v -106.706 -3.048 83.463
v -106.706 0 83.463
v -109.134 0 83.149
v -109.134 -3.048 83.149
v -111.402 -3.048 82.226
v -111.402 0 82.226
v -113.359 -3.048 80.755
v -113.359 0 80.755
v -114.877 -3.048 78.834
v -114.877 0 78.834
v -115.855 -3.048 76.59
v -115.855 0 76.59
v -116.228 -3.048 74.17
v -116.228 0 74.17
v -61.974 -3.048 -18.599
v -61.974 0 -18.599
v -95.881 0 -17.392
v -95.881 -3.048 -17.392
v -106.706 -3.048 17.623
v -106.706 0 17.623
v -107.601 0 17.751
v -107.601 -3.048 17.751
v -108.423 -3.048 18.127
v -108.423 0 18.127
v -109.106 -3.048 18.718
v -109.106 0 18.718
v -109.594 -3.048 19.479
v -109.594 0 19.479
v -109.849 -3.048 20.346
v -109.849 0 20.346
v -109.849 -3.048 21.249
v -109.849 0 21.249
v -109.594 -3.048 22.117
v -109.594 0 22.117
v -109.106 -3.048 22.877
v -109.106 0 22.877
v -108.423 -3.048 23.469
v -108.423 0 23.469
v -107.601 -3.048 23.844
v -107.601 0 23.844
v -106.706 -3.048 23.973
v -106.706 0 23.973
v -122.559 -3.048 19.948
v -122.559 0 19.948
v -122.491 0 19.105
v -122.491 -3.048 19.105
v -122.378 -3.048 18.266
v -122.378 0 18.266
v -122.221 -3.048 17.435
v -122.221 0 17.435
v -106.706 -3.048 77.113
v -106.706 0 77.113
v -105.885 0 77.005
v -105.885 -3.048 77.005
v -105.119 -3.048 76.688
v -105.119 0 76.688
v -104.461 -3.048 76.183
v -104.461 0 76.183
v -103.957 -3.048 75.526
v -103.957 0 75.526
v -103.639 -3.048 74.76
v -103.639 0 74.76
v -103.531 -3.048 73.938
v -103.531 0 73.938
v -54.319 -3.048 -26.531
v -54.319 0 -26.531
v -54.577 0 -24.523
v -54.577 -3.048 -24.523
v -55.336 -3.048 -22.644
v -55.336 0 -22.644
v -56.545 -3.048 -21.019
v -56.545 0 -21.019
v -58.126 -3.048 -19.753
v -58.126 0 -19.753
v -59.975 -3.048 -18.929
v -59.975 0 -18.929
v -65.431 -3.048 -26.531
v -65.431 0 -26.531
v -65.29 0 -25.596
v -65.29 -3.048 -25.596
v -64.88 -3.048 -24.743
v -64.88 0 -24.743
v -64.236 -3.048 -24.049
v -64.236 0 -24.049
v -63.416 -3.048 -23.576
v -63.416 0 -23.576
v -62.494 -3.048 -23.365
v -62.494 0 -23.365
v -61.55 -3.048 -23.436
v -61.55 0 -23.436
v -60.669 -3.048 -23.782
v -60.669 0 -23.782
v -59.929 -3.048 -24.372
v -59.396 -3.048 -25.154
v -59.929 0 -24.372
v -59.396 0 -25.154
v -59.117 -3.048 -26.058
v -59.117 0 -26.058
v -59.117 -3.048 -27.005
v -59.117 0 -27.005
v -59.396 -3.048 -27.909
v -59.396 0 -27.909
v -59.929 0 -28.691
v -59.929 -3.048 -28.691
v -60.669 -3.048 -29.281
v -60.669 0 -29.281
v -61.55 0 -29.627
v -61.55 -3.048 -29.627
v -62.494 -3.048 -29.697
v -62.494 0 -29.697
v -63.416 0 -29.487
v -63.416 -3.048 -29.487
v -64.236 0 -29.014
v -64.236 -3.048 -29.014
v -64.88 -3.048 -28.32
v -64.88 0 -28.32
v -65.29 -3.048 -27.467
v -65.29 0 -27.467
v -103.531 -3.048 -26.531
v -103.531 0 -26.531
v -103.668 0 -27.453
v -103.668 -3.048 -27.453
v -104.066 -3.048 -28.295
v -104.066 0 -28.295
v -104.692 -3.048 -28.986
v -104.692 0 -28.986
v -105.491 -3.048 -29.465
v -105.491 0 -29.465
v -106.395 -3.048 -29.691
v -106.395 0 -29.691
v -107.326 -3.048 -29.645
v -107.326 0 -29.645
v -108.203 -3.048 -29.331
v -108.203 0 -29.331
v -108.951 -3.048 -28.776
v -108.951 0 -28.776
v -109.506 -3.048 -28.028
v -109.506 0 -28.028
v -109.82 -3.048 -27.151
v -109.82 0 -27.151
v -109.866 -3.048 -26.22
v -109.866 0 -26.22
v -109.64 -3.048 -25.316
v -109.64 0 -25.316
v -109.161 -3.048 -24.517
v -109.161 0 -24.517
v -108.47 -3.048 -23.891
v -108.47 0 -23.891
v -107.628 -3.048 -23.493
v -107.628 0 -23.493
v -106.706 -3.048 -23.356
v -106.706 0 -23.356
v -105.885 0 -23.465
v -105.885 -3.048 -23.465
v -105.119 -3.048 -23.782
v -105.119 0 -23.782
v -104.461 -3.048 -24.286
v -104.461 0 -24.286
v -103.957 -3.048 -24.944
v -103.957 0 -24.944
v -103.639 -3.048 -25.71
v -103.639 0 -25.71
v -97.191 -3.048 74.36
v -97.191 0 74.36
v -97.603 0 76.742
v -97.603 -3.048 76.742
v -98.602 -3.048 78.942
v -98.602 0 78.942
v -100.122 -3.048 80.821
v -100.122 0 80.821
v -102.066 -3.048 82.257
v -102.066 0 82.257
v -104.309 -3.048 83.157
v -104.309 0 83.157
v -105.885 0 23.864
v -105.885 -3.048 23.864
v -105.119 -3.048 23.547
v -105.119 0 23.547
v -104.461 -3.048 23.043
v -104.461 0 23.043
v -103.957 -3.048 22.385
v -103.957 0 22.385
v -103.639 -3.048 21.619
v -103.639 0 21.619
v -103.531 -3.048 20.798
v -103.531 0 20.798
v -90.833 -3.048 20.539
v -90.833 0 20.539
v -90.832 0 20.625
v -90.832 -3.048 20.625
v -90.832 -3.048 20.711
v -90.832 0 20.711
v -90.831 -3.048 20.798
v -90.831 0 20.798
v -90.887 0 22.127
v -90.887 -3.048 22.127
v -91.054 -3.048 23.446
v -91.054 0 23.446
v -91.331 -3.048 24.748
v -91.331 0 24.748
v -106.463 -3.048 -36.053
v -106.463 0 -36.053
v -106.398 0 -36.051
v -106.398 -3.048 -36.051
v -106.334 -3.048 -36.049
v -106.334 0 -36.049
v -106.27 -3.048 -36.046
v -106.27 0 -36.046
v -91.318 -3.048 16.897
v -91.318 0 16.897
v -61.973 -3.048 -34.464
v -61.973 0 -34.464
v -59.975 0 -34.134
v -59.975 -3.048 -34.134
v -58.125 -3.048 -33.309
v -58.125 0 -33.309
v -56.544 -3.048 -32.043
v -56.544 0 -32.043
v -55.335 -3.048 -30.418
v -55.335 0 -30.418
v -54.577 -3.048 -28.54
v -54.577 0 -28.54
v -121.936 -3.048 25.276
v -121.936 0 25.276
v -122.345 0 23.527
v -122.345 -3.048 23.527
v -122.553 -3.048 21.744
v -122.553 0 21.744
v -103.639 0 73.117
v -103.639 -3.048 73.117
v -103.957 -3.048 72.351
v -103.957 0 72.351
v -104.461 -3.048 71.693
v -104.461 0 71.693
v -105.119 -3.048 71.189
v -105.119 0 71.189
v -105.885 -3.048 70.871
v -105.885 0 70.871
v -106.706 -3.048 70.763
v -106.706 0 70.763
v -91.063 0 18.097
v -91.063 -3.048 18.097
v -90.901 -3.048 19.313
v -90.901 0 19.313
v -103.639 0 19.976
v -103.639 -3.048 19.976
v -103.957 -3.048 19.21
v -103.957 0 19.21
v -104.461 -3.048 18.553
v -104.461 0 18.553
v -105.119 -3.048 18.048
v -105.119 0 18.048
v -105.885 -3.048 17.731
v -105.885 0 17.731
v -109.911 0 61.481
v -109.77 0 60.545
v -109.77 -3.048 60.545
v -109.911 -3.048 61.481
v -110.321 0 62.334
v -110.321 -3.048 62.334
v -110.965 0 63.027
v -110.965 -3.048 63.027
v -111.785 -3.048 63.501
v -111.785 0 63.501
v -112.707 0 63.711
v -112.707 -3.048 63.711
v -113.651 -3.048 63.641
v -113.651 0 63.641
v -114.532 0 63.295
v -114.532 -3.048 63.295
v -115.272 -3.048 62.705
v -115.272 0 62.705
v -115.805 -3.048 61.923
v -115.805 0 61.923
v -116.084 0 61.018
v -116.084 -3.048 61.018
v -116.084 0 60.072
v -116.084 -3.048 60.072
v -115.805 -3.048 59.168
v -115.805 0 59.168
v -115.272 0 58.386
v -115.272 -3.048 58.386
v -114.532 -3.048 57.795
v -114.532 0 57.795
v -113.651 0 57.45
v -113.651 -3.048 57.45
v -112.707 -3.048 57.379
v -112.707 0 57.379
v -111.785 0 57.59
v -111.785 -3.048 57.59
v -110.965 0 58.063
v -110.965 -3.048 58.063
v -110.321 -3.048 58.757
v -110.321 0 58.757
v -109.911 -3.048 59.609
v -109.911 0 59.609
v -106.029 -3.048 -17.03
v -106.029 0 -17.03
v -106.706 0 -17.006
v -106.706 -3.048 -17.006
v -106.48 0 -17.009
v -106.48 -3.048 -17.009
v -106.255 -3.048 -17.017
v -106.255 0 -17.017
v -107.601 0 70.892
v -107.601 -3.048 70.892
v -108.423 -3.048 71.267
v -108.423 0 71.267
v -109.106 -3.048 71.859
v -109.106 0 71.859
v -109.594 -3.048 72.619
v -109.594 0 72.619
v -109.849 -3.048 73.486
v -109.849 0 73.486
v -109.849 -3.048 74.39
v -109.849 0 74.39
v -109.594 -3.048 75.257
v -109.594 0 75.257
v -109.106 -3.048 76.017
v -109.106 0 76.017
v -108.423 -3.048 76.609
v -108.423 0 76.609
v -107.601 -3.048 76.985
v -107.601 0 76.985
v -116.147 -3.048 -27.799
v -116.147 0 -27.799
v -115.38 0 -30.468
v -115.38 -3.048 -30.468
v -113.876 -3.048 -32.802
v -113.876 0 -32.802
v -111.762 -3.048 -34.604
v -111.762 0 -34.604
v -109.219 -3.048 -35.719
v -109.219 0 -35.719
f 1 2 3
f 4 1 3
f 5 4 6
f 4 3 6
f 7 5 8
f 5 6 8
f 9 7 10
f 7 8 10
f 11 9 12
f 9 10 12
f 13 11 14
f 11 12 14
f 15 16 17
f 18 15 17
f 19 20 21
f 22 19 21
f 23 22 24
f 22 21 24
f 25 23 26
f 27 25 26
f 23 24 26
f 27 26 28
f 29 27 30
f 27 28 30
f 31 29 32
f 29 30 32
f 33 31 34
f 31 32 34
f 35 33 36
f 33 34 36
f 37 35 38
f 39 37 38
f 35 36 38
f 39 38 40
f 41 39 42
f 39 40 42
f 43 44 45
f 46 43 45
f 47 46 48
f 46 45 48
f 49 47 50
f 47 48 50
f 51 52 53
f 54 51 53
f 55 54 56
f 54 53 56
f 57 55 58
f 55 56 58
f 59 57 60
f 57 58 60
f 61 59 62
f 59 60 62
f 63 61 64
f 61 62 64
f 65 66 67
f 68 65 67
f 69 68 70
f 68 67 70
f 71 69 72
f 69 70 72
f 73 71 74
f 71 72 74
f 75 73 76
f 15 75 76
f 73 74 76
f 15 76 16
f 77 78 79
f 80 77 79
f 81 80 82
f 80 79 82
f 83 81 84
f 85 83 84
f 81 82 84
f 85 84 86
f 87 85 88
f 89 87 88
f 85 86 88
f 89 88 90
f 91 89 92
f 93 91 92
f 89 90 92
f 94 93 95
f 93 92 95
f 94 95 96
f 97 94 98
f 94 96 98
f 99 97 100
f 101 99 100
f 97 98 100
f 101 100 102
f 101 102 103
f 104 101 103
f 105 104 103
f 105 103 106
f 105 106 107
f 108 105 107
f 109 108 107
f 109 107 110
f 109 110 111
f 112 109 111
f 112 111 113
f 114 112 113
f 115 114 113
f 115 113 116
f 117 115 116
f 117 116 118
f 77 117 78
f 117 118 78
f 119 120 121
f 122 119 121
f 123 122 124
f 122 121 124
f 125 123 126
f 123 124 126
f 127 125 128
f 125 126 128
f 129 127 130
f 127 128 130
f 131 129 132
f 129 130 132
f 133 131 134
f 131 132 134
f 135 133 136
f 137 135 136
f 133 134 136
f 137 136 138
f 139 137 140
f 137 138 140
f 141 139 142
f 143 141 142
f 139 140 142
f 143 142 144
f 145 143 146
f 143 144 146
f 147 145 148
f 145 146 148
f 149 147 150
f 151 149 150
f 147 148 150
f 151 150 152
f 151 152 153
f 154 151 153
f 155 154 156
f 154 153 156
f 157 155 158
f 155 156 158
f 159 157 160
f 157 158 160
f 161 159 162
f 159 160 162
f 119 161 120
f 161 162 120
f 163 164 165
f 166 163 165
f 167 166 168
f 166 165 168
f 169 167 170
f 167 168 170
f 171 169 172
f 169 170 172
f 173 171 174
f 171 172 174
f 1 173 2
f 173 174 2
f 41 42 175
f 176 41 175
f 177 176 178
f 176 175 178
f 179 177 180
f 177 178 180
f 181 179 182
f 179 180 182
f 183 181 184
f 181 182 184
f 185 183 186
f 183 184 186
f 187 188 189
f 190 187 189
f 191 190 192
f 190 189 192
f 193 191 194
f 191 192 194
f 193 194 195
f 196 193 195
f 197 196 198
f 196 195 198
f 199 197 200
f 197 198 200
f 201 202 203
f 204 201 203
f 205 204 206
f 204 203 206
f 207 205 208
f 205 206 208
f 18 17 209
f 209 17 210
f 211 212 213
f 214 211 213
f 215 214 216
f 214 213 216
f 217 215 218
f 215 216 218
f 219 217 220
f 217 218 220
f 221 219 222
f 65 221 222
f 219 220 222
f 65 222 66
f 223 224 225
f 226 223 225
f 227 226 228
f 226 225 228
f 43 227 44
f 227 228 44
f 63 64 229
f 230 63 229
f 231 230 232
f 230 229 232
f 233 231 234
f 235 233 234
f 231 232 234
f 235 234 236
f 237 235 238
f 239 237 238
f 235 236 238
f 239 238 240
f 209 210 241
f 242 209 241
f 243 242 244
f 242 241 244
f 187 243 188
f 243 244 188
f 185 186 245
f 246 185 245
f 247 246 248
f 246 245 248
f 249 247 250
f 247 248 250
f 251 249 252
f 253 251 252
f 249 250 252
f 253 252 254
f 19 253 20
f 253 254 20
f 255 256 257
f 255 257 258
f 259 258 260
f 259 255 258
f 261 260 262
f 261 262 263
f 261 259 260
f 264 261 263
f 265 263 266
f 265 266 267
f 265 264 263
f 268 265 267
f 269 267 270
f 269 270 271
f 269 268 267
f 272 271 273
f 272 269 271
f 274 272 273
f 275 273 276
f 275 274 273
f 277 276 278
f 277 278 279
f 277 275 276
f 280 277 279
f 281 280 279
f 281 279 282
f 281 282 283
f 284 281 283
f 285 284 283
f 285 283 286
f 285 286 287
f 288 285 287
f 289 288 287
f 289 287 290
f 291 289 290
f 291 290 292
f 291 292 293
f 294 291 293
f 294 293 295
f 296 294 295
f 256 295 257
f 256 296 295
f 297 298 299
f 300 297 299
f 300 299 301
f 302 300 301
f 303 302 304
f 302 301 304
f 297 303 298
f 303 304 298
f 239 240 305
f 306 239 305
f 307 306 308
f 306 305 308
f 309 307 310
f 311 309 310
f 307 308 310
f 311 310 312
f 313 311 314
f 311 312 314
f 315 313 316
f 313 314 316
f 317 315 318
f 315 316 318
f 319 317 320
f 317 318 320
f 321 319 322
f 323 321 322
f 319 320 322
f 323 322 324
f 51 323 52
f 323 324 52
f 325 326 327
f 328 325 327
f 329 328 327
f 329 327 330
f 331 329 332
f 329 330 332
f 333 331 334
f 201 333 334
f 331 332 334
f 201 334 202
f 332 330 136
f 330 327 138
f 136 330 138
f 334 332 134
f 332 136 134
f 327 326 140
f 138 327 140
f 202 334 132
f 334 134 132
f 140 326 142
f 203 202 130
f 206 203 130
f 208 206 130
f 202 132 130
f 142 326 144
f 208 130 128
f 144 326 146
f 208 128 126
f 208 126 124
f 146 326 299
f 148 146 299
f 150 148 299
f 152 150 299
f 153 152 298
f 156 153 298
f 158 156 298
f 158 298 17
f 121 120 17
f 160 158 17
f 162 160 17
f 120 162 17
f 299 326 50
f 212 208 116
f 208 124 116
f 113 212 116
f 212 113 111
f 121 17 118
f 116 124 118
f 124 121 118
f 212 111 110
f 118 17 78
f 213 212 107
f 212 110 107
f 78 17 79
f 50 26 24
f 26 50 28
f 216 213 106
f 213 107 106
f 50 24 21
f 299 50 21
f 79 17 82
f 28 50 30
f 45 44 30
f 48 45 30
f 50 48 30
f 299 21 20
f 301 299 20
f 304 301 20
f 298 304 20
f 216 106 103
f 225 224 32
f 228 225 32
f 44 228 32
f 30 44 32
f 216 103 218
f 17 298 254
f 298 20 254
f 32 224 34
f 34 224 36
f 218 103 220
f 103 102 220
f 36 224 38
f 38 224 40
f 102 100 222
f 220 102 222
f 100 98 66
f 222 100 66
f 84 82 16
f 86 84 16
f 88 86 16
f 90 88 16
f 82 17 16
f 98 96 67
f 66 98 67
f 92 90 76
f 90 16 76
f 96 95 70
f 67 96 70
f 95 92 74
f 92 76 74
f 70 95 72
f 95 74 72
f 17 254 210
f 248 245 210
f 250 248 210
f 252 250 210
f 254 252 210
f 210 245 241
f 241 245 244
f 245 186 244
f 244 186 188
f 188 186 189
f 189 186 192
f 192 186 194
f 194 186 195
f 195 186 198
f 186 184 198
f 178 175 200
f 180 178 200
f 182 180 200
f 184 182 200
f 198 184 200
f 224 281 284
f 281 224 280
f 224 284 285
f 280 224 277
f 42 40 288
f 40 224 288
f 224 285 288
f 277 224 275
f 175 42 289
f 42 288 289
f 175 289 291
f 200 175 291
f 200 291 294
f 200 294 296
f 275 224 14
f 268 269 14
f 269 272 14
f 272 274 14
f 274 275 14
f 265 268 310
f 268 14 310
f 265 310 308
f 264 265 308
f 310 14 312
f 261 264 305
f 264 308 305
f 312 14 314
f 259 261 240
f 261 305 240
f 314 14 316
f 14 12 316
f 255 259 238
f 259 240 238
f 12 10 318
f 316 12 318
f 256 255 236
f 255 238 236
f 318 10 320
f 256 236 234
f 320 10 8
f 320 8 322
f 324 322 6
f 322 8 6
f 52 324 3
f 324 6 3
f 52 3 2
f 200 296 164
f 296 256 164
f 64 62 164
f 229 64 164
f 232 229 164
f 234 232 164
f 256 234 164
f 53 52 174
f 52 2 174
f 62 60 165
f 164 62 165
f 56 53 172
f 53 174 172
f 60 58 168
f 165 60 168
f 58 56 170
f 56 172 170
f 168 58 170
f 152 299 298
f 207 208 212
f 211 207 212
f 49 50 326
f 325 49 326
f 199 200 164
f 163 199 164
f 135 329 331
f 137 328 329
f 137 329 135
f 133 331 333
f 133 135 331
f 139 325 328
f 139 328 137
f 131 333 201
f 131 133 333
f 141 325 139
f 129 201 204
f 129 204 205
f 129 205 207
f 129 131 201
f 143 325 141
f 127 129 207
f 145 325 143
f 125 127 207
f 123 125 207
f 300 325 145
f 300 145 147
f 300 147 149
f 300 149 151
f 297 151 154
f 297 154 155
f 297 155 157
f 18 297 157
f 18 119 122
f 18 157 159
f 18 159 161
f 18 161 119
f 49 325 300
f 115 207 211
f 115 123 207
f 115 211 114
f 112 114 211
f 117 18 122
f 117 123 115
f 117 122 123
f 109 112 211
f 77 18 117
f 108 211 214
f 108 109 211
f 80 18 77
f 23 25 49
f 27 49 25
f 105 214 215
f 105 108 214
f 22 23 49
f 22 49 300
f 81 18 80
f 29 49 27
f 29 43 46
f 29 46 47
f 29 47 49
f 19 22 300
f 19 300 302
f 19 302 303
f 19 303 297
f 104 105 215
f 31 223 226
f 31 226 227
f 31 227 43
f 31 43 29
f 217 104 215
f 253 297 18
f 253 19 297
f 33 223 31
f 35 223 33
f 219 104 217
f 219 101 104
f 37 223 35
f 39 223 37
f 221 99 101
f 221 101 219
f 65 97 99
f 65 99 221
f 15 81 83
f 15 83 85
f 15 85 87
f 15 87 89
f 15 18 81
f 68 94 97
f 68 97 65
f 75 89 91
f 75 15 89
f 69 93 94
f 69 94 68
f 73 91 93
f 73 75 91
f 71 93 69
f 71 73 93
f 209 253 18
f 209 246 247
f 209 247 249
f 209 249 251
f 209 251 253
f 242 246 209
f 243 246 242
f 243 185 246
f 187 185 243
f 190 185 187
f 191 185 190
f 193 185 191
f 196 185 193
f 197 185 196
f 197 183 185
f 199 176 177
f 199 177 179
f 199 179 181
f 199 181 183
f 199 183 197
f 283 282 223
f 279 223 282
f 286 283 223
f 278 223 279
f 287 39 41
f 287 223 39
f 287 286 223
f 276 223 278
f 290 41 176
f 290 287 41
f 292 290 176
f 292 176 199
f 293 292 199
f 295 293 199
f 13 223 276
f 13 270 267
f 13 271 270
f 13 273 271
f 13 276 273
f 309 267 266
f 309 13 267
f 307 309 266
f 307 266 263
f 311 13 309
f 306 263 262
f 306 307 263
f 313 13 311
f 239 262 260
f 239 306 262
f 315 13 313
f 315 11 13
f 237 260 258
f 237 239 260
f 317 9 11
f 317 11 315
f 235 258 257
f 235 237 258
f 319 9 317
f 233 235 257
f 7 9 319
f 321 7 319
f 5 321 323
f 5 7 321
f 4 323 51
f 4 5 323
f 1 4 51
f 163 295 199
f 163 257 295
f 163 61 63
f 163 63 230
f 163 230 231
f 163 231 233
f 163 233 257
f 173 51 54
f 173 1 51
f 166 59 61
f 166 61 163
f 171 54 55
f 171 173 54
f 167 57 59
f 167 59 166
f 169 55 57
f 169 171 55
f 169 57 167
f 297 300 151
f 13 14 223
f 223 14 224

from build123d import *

# Parameters (mm, degrees)
F0_R     = 3.175
F1_DEPTH = 3.048


with BuildPart() as f1:
    # F0 (on Front) → F1 (new body)
    with BuildSketch(Plane.XZ):
        with BuildLine():
            ThreePointArc((-97.190643335, 74.3602226092), (-100.121969827, 80.8210350642), (-106.7062930619, 83.463280344))
            Line((-106.7062930619, 83.463280344), (-106.7062930619, 77.113280344))
            ThreePointArc((-106.7062930619, 77.113280344), (-104.4612290316, 76.1833443743), (-103.5312930619, 73.938280344))
            ThreePointArc((-103.5312930619, 73.938280344), (-104.4612290316, 71.6932163137), (-106.7062930619, 70.763280344))
            Line((-106.7062930619, 70.763280344), (-106.7062930619, 64.413280344))
            ThreePointArc((-106.7062930619, 64.413280344), (-99.9711009711, 67.2030882532), (-97.1812930619, 73.938280344))
            ThreePointArc((-97.1812930619, 73.938280344), (-97.1836309171, 74.1493032709), (-97.190643335, 74.3602226092))
        make_face()
        with BuildLine():
            Line((-106.7062930619, 77.113280344), (-106.7062930619, 83.463280344))
            ThreePointArc((-106.7062930619, 83.463280344), (-113.3589155182, 80.7550419985), (-116.2284645394, 74.1703909904))
            ThreePointArc((-116.2284645394, 74.1703909904), (-113.5230547163, 67.2856578877), (-106.7062930619, 64.413280344))
            Line((-106.7062930619, 64.413280344), (-106.7062930619, 70.763280344))
            ThreePointArc((-106.7062930619, 70.763280344), (-109.8812930619, 73.938280344), (-106.7062930619, 77.113280344))
        make_face()
        with BuildLine():
            Line((-91.3305569208, 24.7476115825), (-97.190643335, 74.3602226092))
            ThreePointArc((-97.190643335, 74.3602226092), (-97.1836309171, 74.1493032709), (-97.1812930619, 73.938280344))
            ThreePointArc((-97.1812930619, 73.938280344), (-99.9711009711, 67.2030882532), (-106.7062930619, 64.413280344))
            Line((-106.7062930619, 64.413280344), (-106.7062930619, 36.6726289093))
            ThreePointArc((-106.7062930619, 36.6726289093), (-96.977221933, 33.3419822194), (-91.3305569208, 24.7476115825))
        make_face()
        with BuildLine():
            ThreePointArc((-106.7062930619, 64.413280344), (-113.5230547163, 67.2856578877), (-116.2284645394, 74.1703909904))
            Line((-116.2284645394, 74.1703909904), (-121.9364228074, 25.2763310577))
            ThreePointArc((-121.9364228074, 25.2763310577), (-116.2172401334, 33.5081564674), (-106.7062930619, 36.6726289093))
            Line((-106.7062930619, 36.6726289093), (-106.7062930619, 64.413280344))
        make_face()
        with Locations((-112.9446998239, 60.5451092124)):
            Circle(F0_R, mode=Mode.SUBTRACT)
        with BuildLine():
            Line((-90.8334058763, 20.5386358703), (-91.3305569208, 24.7476115825))
            ThreePointArc((-91.3305569208, 24.7476115825), (-96.977221933, 33.3419822194), (-106.7062930619, 36.6726289093))
            Line((-106.7062930619, 36.6726289093), (-106.7062930619, 23.9726289093))
            ThreePointArc((-106.7062930619, 23.9726289093), (-104.4612290316, 23.0426929396), (-103.5312930619, 20.7976289093))
            ThreePointArc((-103.5312930619, 20.7976289093), (-104.4612290316, 18.5525648791), (-106.7062930619, 17.6226289093))
            Line((-106.7062930619, 17.6226289093), (-106.7062930619, 4.9226289093))
            ThreePointArc((-106.7062930619, 4.9226289093), (-96.9573127505, 8.2687419721), (-91.3180887059, 16.8965019314))
            Line((-91.3180887059, 16.8965019314), (-90.8334058763, 20.5386358703))
        make_face()
        with BuildLine():
            ThreePointArc((-90.8312930619, 20.7976289093), (-90.9566036008, 22.7883340306), (-91.3305569208, 24.7476115825))
            Line((-91.3305569208, 24.7476115825), (-90.8334058763, 20.5386358703))
            ThreePointArc((-90.8334058763, 20.5386358703), (-90.8318212743, 20.6681280809), (-90.8312930619, 20.7976289093))
        make_face()
        with BuildLine():
            Line((-122.5585151056, 19.9475222821), (-121.9364228074, 25.2763310577))
            ThreePointArc((-121.9364228074, 25.2763310577), (-122.4742098212, 22.6383967032), (-122.5585151056, 19.9475222821))
        make_face()
        with BuildLine():
            ThreePointArc((-106.7062930619, 36.6726289093), (-116.2172401334, 33.5081564674), (-121.9364228074, 25.2763310577))
            Line((-121.9364228074, 25.2763310577), (-122.5585151056, 19.9475222821))
            Line((-122.5585151056, 19.9475222821), (-122.2211590079, 17.435403504))
            ThreePointArc((-122.2211590079, 17.435403504), (-116.6722425071, 8.4406277903), (-106.7062930619, 4.9226289093))
            Line((-106.7062930619, 4.9226289093), (-106.7062930619, 17.6226289093))
            ThreePointArc((-106.7062930619, 17.6226289093), (-109.8812930619, 20.7976289093), (-106.7062930619, 23.9726289093))
            Line((-106.7062930619, 23.9726289093), (-106.7062930619, 36.6726289093))
        make_face()
        with BuildLine():
            ThreePointArc((-91.3180887059, 16.8965019314), (-90.9700213942, 18.7034992571), (-90.8334058763, 20.5386358703))
            Line((-90.8334058763, 20.5386358703), (-91.3180887059, 16.8965019314))
        make_face()
        with BuildLine():
            Line((-122.2211590079, 17.435403504), (-122.5585151056, 19.9475222821))
            ThreePointArc((-122.5585151056, 19.9475222821), (-122.4400541325, 18.6847191686), (-122.2211590079, 17.435403504))
        make_face()
        with BuildLine():
            Line((-95.8810541015, -17.3917585872), (-91.3180887059, 16.8965019314))
            ThreePointArc((-91.3180887059, 16.8965019314), (-96.9573127505, 8.2687419721), (-106.7062930619, 4.9226289093))
            Line((-106.7062930619, 4.9226289093), (-106.7062930619, -17.0063675549))
            ThreePointArc((-106.7062930619, -17.0063675549), (-106.3674067324, -17.0123980174), (-106.028949514, -17.0304817689))
            Line((-106.028949514, -17.0304817689), (-95.8810541015, -17.3917585872))
        make_face()
        with BuildLine():
            ThreePointArc((-106.7062930619, 4.9226289093), (-116.6722425071, 8.4406277903), (-122.2211590079, 17.435403504))
            Line((-122.2211590079, 17.435403504), (-116.1465497043, -27.7991133993))
            ThreePointArc((-116.1465497043, -27.7991133993), (-113.8757039222, -20.2603889298), (-106.7062930619, -17.0063675549))
            Line((-106.7062930619, -17.0063675549), (-106.7062930619, 4.9226289093))
        make_face()
        with BuildLine():
            Line((-61.9738877873, -18.5988929403), (-95.8810541015, -17.3917585872))
            Line((-95.8810541015, -17.3917585872), (-97.0973222591, -26.5313675549))
            Line((-97.0973222591, -26.5313675549), (-70.1937930619, -26.5313675549))
            ThreePointArc((-70.1937930619, -26.5313675549), (-67.7682035466, -20.819734771), (-61.9738877873, -18.5988929403))
        make_face()
        with BuildLine():
            Line((-97.0973222591, -26.5313675549), (-95.8810541015, -17.3917585872))
            Line((-95.8810541015, -17.3917585872), (-106.028949514, -17.0304817689))
            ThreePointArc((-106.028949514, -17.0304817689), (-99.7357363304, -20.0400684666), (-97.1812930619, -26.5313675549))
            Line((-97.1812930619, -26.5313675549), (-97.0973222591, -26.5313675549))
        make_face()
        with BuildLine():
            ThreePointArc((-106.7062930619, -17.0063675549), (-113.8757039222, -20.2603889298), (-116.1465497043, -27.7991133993))
            ThreePointArc((-116.1465497043, -27.7991133993), (-112.8850424708, -33.78041444), (-106.4626122264, -36.053249966))
            Line((-106.4626122264, -36.053249966), (-106.269860848, -36.0463637148))
            ThreePointArc((-106.269860848, -36.0463637148), (-99.8185270294, -33.1104483479), (-97.1812930619, -26.5313675549))
            Line((-97.1812930619, -26.5313675549), (-103.5312930619, -26.5313675549))
            ThreePointArc((-103.5312930619, -26.5313675549), (-108.9513570922, -28.7764315852), (-106.7062930619, -23.3563675549))
            Line((-106.7062930619, -23.3563675549), (-106.7062930619, -17.0063675549))
        make_face()
        with BuildLine():
            Line((-70.1937930619, -26.5313675549), (-97.0973222591, -26.5313675549))
            Line((-97.0973222591, -26.5313675549), (-97.1812930619, -26.5313675549))
            ThreePointArc((-97.1812930619, -26.5313675549), (-99.8185270294, -33.1104483479), (-106.269860848, -36.0463637148))
            Line((-106.269860848, -36.0463637148), (-61.9728980991, -34.4638068736))
            ThreePointArc((-61.9728980991, -34.4638068736), (-67.7678472317, -32.2433441728), (-70.1937930619, -26.5313675549))
        make_face()
        with BuildLine():
            ThreePointArc((-54.3187930619, -26.5313675549), (-56.544660278, -21.0194570702), (-61.9738877873, -18.5988929403))
            ThreePointArc((-61.9738877873, -18.5988929403), (-67.7682035466, -20.819734771), (-70.1937930619, -26.5313675549))
            ThreePointArc((-70.1937930619, -26.5313675549), (-67.7678472317, -32.2433441728), (-61.9728980991, -34.4638068736))
            ThreePointArc((-61.9728980991, -34.4638068736), (-56.544316444, -32.0429217247), (-54.3187930619, -26.5313675549))
        make_face()
        with BuildLine():
            ThreePointArc((-59.0812930619, -26.5313675549), (-62.2562930619, -29.7063675549), (-65.4312930619, -26.5313675549))
            ThreePointArc((-65.4312930619, -26.5313675549), (-62.2562930619, -23.3563675549), (-59.0812930619, -26.5313675549))
        make_face(mode=Mode.SUBTRACT)
        with BuildLine():
            Line((-106.269860848, -36.0463637148), (-106.4626122264, -36.053249966))
            ThreePointArc((-106.4626122264, -36.053249966), (-106.3662191065, -36.0502947373), (-106.269860848, -36.0463637148))
        make_face()
        with BuildLine():
            Line((-106.028949514, -17.0304817689), (-106.7062930619, -17.0063675549))
            Line((-106.7062930619, -17.0063675549), (-106.7062930619, -23.3563675549))
            ThreePointArc((-106.7062930619, -23.3563675549), (-104.4612290316, -24.2863035246), (-103.5312930619, -26.5313675549))
            Line((-103.5312930619, -26.5313675549), (-97.1812930619, -26.5313675549))
            ThreePointArc((-97.1812930619, -26.5313675549), (-99.7357363304, -20.0400684666), (-106.028949514, -17.0304817689))
        make_face()
    extrude(amount=F1_DEPTH)


solid = f1.part
